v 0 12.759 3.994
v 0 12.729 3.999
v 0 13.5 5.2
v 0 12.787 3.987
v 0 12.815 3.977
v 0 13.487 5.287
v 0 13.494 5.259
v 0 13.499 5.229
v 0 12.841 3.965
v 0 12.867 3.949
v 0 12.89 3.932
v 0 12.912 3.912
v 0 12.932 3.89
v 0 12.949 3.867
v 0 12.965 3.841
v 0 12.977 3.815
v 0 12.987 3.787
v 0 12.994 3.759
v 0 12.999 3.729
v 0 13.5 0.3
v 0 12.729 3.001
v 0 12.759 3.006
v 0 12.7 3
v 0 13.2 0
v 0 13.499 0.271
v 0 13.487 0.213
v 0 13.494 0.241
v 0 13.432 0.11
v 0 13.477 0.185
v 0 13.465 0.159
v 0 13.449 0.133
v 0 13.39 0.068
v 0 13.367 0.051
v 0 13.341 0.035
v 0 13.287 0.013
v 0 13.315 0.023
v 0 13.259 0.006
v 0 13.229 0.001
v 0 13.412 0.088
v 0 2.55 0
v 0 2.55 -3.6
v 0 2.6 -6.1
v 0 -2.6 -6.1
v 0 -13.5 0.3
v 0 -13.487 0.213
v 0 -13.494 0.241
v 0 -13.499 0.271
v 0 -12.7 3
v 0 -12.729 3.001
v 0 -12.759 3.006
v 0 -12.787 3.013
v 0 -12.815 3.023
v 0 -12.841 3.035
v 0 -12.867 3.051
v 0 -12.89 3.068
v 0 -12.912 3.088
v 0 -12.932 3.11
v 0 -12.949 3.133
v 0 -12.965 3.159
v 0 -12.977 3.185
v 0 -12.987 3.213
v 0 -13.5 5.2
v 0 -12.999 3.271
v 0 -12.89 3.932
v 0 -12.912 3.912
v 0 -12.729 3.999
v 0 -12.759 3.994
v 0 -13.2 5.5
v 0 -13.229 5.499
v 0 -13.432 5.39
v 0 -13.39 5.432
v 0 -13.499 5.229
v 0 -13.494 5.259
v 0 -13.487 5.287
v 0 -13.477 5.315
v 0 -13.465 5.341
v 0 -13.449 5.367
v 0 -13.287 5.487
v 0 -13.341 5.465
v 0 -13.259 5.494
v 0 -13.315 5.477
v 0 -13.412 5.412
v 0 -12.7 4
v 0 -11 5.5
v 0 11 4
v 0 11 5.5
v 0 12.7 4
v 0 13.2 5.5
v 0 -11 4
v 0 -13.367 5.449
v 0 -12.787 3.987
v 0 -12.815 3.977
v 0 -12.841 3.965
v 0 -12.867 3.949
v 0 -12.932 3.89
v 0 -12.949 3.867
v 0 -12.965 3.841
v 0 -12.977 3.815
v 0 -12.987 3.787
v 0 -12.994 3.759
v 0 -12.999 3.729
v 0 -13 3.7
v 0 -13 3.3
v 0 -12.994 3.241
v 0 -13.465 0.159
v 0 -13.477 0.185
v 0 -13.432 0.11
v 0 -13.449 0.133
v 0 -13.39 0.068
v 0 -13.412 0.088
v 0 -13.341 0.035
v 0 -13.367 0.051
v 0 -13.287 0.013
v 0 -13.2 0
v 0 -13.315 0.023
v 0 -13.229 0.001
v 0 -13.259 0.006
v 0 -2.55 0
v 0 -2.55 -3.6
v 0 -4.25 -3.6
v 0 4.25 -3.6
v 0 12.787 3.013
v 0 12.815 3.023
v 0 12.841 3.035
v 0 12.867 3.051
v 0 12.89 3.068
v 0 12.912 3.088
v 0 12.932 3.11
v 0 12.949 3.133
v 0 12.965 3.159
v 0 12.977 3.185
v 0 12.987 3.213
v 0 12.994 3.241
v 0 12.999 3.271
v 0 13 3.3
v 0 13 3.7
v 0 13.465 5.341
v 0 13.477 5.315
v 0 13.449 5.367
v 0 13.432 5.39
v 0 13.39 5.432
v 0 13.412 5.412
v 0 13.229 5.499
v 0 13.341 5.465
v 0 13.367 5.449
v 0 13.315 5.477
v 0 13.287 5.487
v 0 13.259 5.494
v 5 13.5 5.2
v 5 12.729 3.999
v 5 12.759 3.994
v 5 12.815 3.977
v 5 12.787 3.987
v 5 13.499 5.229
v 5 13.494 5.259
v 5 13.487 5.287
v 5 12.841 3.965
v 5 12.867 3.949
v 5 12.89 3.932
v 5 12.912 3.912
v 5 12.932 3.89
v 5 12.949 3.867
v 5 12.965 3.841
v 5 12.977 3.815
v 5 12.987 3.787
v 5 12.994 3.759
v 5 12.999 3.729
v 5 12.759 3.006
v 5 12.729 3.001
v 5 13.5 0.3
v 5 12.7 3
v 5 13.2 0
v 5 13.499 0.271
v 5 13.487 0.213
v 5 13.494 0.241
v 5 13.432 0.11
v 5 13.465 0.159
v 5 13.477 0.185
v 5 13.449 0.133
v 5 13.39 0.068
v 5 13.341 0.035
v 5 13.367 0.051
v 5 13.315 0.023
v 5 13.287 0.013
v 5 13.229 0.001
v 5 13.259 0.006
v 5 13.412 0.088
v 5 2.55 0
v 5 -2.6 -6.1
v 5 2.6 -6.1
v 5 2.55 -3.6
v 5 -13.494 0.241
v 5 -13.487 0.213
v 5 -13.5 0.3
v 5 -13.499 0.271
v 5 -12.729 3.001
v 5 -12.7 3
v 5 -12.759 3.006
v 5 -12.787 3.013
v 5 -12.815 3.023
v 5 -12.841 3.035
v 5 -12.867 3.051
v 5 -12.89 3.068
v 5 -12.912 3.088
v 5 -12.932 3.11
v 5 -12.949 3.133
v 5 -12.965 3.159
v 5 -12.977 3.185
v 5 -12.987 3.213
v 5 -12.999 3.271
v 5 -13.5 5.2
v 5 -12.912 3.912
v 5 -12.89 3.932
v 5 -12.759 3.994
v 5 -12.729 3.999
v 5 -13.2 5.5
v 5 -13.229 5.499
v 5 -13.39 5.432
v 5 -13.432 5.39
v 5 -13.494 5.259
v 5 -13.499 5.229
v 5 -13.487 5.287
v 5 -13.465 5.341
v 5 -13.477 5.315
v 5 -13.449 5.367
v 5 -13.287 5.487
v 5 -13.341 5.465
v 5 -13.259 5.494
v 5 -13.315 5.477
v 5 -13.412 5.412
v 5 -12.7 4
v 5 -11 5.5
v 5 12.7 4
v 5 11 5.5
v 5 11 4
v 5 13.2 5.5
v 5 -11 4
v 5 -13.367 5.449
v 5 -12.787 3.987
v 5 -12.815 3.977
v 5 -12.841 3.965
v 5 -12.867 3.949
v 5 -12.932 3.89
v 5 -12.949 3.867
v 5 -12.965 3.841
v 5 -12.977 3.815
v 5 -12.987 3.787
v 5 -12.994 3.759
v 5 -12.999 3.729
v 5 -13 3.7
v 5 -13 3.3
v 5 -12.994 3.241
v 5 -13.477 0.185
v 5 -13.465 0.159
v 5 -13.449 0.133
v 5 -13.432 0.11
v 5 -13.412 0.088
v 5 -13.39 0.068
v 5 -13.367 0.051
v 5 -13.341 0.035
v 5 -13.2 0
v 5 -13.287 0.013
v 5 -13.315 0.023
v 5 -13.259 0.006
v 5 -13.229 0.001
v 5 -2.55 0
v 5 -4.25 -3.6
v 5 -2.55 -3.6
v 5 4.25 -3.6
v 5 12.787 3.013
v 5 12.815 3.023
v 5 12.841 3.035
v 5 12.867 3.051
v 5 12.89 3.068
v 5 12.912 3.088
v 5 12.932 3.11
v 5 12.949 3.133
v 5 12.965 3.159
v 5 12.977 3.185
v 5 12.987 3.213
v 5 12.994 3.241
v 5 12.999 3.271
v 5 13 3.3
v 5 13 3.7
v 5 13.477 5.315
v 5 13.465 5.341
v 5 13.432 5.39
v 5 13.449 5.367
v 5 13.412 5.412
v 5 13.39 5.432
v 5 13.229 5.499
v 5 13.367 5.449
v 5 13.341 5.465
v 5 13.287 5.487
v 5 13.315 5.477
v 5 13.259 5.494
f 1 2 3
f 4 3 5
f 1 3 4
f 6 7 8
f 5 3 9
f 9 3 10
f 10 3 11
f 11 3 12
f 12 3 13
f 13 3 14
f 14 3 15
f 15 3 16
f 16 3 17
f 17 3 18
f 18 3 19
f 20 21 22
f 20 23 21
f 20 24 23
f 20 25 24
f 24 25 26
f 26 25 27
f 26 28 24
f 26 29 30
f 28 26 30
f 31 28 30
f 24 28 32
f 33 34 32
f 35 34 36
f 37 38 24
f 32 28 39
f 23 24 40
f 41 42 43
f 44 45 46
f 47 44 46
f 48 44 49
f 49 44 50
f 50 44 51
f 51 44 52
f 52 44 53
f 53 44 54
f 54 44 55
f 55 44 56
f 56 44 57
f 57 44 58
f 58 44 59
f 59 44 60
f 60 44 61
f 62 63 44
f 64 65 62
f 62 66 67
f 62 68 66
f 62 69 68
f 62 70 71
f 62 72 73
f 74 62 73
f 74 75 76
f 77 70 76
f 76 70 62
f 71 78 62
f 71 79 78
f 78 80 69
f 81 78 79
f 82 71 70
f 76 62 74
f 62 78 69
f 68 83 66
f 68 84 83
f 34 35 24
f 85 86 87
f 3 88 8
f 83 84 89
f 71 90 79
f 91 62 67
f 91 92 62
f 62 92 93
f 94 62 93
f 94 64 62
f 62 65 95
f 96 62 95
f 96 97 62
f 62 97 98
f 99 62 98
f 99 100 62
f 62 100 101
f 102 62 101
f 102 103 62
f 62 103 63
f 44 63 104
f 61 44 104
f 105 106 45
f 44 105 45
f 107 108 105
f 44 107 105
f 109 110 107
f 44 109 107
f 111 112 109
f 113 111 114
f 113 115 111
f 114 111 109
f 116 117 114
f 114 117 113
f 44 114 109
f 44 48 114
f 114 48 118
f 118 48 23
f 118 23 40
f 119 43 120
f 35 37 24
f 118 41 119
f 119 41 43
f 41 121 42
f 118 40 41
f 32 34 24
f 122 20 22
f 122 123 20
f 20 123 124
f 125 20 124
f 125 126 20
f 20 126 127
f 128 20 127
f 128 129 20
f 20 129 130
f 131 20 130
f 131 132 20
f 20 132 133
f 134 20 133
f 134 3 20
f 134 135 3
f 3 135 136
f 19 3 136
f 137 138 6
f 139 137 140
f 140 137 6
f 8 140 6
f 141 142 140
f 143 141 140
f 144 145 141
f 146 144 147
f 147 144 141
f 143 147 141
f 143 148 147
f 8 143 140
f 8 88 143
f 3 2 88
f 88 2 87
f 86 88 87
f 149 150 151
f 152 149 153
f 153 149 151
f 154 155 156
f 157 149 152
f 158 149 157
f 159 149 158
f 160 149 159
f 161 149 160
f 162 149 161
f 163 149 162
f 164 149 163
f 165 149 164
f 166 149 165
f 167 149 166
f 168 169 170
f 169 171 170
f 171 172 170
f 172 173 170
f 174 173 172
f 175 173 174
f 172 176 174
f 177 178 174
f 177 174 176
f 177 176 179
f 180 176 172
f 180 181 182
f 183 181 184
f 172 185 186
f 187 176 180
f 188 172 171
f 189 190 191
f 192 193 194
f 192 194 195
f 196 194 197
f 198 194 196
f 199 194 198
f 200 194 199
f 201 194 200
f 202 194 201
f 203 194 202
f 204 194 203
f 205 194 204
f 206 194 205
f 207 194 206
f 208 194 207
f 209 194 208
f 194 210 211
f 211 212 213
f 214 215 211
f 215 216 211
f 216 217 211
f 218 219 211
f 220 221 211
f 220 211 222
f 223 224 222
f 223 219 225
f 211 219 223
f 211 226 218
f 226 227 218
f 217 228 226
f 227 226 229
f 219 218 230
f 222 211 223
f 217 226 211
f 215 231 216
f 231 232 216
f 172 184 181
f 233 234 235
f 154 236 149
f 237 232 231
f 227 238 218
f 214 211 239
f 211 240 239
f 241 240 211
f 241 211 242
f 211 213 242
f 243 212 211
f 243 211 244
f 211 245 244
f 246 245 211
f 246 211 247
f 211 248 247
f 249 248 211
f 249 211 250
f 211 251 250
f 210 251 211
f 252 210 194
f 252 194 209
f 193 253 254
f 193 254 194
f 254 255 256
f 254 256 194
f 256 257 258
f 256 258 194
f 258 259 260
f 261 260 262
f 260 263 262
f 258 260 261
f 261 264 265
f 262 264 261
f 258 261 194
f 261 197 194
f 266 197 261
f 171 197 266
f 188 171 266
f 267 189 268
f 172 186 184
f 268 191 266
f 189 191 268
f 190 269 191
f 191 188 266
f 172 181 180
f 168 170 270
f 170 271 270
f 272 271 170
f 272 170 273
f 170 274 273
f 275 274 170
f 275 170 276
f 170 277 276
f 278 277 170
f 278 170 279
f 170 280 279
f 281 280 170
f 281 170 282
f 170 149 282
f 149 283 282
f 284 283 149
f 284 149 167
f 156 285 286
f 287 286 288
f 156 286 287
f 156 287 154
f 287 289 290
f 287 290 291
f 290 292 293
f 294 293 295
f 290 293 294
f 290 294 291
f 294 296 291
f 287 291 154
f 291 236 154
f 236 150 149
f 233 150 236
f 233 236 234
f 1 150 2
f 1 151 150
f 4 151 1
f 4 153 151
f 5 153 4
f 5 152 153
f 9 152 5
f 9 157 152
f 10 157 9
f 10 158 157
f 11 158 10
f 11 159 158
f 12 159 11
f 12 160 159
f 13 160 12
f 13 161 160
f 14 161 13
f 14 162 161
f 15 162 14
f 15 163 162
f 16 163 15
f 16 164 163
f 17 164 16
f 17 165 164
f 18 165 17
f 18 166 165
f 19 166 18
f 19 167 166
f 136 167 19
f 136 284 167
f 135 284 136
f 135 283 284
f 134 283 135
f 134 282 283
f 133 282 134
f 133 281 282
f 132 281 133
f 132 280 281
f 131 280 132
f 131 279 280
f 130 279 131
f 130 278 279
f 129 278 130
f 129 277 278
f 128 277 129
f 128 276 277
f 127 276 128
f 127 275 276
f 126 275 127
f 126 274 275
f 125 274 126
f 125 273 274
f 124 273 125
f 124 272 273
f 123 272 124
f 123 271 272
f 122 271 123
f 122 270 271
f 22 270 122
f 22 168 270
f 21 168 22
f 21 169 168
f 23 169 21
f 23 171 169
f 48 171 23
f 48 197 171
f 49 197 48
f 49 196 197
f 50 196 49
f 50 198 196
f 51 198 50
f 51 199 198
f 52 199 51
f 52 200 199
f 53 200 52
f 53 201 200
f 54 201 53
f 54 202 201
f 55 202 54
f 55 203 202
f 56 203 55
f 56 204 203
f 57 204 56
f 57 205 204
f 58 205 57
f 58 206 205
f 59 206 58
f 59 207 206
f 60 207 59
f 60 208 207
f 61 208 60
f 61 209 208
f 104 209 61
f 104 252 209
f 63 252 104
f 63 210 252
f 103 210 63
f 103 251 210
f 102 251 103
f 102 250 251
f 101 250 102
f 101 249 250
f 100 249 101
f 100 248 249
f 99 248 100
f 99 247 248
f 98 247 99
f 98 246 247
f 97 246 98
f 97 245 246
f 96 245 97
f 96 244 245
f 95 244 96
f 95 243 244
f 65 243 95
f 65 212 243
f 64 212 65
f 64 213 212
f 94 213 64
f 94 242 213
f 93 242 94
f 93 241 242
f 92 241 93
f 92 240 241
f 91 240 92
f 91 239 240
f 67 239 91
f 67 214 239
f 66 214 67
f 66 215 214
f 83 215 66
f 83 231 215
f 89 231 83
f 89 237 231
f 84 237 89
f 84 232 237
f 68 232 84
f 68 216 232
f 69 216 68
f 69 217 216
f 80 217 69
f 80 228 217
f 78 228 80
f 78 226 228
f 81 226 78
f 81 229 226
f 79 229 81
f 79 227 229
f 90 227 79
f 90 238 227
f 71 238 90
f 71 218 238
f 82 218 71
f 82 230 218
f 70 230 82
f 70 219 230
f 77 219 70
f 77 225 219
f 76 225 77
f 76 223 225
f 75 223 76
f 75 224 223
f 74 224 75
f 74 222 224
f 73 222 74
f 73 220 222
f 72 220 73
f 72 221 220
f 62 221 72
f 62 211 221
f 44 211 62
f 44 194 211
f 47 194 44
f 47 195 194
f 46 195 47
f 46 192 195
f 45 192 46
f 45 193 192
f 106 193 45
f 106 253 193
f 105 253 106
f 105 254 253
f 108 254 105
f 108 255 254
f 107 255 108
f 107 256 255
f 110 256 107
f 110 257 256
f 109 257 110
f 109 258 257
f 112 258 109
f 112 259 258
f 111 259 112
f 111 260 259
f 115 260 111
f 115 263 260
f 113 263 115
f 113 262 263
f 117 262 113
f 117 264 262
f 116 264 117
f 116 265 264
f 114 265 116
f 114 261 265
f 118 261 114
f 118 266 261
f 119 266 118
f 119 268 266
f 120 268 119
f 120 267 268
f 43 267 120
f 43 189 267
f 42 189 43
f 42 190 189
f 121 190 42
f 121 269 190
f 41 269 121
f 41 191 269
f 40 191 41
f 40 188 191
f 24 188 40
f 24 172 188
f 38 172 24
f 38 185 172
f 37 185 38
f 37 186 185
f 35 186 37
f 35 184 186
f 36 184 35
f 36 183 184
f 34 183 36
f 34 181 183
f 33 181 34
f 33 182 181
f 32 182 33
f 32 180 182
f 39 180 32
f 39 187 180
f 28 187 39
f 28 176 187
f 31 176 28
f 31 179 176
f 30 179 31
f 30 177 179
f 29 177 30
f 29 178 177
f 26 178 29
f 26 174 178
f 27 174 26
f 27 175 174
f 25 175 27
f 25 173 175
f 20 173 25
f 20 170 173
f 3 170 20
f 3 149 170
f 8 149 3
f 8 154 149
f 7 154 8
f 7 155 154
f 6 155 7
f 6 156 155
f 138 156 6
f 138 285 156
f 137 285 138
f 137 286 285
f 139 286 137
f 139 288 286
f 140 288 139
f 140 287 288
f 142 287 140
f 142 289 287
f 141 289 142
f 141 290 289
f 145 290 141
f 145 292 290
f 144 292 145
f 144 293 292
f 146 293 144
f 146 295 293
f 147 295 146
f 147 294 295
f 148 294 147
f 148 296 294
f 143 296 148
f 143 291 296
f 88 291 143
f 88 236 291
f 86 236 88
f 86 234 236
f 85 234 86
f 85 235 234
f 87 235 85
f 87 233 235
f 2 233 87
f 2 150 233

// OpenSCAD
// 2020 adapter with one full-width top cavity.

// ---- parameters ----------------------------------------------------------

length              = 5;  // rail length. My printer can only print 100mm wide so
                              // 84HP = 128.5; 104HP = 158.75; etc.

// 2020 slot profile (generic Misumi-style tapered T-slot).
slot_opening        = 5.3;    // gap between outer lips (+0.2 clearance)
slot_lip_depth      = 3.6;    // depth of the straight opening between lips
slot_chamfer_depth  = 2.5;    // depth of the tapered transition (lips flaring out)
slot_inner_width    = 9.1;    // width at the top of the chamfer (just past the lips)
slot_tip_width      = 5.8;    // width of the flat tip at the bottom of the chamfer

// Tab geometry
use_t_tab           = true;   // true = full T-profile matching the tapered slot
                              // false = simple rectangular stem only.
tab_clearance       = 0.3;    // shrink applied to head dimensions

// Main body sitting on the extrusion's outer face
body_width          = 27.0;   // Y extent of the shelf
body_thickness      = 3.0;    // Z thickness below the strip channel

// Single full-width top cavity.
strip_width         = body_width - 1.0; // make cavity span the entire face
strip_height        = 1.0;         // Z height of the cavity
strip_lip           = 1.5;         // Z thickness above the cavity

// Full-width access cut through the top face.
access_slot_width   = body_width - 5;

// Corner rounding (applied to shelf and strip cavities)
fillet              = 0.3;

$fn = 64;

// ---- derived -------------------------------------------------------------

tab_stem_w    = slot_opening - 0.2;
tab_head_w    = slot_inner_width - 2*tab_clearance;
tab_tip_w     = slot_tip_width - 2*tab_clearance;
tab_chamfer_h = slot_chamfer_depth;
total_h       = body_thickness + strip_height + strip_lip;

// ---- 2D cross-section (in the Y-Z plane) --------------------------------

module rounded_rect_2d(size, r) {
    if (r <= 0) {
        square(size);
    } else {
        hull()
            for (x = [r, size[0] - r])
                for (y = [r, size[1] - r])
                    translate([x, y]) circle(r);
    }
}

module tab_profile_2d() {
    if (use_t_tab) {
        z_stem_bot    = -slot_lip_depth;
        z_chamfer_bot = z_stem_bot - tab_chamfer_h;
        polygon(points = [
            [-tab_stem_w/2, 0],
            [ tab_stem_w/2, 0],
            [ tab_stem_w/2, z_stem_bot],
            [ tab_head_w/2, z_stem_bot],
            [ tab_tip_w/2,  z_chamfer_bot],
            [-tab_tip_w/2,  z_chamfer_bot],
            [-tab_head_w/2, z_stem_bot],
            [-tab_stem_w/2, z_stem_bot],
        ]);
    } else {
        translate([-tab_stem_w/2, -slot_lip_depth])
            square([tab_stem_w, slot_lip_depth]);
    }
}

module rail_profile_2d() {
    // Cut one centered cavity and one centered top access cut.
    difference() {
        union() {
            translate([-body_width/2, 0])
                rounded_rect_2d([body_width, total_h], fillet);
            tab_profile_2d();
        }

        translate([-strip_width/2, body_thickness])
            rounded_rect_2d([strip_width, strip_height], fillet);

        translate([-access_slot_width/2,
                   body_thickness + strip_height])
            square([access_slot_width, strip_lip + 0.1]);
    }
}

// ---- 3D ------------------------------------------------------------------

module rail() {
    rotate([90, 0, 90])
        linear_extrude(height = length, convexity = 4)
            rail_profile_2d();
}

rail();

// Uncomment to preview just the cross-section:
//rail_profile_2d();
